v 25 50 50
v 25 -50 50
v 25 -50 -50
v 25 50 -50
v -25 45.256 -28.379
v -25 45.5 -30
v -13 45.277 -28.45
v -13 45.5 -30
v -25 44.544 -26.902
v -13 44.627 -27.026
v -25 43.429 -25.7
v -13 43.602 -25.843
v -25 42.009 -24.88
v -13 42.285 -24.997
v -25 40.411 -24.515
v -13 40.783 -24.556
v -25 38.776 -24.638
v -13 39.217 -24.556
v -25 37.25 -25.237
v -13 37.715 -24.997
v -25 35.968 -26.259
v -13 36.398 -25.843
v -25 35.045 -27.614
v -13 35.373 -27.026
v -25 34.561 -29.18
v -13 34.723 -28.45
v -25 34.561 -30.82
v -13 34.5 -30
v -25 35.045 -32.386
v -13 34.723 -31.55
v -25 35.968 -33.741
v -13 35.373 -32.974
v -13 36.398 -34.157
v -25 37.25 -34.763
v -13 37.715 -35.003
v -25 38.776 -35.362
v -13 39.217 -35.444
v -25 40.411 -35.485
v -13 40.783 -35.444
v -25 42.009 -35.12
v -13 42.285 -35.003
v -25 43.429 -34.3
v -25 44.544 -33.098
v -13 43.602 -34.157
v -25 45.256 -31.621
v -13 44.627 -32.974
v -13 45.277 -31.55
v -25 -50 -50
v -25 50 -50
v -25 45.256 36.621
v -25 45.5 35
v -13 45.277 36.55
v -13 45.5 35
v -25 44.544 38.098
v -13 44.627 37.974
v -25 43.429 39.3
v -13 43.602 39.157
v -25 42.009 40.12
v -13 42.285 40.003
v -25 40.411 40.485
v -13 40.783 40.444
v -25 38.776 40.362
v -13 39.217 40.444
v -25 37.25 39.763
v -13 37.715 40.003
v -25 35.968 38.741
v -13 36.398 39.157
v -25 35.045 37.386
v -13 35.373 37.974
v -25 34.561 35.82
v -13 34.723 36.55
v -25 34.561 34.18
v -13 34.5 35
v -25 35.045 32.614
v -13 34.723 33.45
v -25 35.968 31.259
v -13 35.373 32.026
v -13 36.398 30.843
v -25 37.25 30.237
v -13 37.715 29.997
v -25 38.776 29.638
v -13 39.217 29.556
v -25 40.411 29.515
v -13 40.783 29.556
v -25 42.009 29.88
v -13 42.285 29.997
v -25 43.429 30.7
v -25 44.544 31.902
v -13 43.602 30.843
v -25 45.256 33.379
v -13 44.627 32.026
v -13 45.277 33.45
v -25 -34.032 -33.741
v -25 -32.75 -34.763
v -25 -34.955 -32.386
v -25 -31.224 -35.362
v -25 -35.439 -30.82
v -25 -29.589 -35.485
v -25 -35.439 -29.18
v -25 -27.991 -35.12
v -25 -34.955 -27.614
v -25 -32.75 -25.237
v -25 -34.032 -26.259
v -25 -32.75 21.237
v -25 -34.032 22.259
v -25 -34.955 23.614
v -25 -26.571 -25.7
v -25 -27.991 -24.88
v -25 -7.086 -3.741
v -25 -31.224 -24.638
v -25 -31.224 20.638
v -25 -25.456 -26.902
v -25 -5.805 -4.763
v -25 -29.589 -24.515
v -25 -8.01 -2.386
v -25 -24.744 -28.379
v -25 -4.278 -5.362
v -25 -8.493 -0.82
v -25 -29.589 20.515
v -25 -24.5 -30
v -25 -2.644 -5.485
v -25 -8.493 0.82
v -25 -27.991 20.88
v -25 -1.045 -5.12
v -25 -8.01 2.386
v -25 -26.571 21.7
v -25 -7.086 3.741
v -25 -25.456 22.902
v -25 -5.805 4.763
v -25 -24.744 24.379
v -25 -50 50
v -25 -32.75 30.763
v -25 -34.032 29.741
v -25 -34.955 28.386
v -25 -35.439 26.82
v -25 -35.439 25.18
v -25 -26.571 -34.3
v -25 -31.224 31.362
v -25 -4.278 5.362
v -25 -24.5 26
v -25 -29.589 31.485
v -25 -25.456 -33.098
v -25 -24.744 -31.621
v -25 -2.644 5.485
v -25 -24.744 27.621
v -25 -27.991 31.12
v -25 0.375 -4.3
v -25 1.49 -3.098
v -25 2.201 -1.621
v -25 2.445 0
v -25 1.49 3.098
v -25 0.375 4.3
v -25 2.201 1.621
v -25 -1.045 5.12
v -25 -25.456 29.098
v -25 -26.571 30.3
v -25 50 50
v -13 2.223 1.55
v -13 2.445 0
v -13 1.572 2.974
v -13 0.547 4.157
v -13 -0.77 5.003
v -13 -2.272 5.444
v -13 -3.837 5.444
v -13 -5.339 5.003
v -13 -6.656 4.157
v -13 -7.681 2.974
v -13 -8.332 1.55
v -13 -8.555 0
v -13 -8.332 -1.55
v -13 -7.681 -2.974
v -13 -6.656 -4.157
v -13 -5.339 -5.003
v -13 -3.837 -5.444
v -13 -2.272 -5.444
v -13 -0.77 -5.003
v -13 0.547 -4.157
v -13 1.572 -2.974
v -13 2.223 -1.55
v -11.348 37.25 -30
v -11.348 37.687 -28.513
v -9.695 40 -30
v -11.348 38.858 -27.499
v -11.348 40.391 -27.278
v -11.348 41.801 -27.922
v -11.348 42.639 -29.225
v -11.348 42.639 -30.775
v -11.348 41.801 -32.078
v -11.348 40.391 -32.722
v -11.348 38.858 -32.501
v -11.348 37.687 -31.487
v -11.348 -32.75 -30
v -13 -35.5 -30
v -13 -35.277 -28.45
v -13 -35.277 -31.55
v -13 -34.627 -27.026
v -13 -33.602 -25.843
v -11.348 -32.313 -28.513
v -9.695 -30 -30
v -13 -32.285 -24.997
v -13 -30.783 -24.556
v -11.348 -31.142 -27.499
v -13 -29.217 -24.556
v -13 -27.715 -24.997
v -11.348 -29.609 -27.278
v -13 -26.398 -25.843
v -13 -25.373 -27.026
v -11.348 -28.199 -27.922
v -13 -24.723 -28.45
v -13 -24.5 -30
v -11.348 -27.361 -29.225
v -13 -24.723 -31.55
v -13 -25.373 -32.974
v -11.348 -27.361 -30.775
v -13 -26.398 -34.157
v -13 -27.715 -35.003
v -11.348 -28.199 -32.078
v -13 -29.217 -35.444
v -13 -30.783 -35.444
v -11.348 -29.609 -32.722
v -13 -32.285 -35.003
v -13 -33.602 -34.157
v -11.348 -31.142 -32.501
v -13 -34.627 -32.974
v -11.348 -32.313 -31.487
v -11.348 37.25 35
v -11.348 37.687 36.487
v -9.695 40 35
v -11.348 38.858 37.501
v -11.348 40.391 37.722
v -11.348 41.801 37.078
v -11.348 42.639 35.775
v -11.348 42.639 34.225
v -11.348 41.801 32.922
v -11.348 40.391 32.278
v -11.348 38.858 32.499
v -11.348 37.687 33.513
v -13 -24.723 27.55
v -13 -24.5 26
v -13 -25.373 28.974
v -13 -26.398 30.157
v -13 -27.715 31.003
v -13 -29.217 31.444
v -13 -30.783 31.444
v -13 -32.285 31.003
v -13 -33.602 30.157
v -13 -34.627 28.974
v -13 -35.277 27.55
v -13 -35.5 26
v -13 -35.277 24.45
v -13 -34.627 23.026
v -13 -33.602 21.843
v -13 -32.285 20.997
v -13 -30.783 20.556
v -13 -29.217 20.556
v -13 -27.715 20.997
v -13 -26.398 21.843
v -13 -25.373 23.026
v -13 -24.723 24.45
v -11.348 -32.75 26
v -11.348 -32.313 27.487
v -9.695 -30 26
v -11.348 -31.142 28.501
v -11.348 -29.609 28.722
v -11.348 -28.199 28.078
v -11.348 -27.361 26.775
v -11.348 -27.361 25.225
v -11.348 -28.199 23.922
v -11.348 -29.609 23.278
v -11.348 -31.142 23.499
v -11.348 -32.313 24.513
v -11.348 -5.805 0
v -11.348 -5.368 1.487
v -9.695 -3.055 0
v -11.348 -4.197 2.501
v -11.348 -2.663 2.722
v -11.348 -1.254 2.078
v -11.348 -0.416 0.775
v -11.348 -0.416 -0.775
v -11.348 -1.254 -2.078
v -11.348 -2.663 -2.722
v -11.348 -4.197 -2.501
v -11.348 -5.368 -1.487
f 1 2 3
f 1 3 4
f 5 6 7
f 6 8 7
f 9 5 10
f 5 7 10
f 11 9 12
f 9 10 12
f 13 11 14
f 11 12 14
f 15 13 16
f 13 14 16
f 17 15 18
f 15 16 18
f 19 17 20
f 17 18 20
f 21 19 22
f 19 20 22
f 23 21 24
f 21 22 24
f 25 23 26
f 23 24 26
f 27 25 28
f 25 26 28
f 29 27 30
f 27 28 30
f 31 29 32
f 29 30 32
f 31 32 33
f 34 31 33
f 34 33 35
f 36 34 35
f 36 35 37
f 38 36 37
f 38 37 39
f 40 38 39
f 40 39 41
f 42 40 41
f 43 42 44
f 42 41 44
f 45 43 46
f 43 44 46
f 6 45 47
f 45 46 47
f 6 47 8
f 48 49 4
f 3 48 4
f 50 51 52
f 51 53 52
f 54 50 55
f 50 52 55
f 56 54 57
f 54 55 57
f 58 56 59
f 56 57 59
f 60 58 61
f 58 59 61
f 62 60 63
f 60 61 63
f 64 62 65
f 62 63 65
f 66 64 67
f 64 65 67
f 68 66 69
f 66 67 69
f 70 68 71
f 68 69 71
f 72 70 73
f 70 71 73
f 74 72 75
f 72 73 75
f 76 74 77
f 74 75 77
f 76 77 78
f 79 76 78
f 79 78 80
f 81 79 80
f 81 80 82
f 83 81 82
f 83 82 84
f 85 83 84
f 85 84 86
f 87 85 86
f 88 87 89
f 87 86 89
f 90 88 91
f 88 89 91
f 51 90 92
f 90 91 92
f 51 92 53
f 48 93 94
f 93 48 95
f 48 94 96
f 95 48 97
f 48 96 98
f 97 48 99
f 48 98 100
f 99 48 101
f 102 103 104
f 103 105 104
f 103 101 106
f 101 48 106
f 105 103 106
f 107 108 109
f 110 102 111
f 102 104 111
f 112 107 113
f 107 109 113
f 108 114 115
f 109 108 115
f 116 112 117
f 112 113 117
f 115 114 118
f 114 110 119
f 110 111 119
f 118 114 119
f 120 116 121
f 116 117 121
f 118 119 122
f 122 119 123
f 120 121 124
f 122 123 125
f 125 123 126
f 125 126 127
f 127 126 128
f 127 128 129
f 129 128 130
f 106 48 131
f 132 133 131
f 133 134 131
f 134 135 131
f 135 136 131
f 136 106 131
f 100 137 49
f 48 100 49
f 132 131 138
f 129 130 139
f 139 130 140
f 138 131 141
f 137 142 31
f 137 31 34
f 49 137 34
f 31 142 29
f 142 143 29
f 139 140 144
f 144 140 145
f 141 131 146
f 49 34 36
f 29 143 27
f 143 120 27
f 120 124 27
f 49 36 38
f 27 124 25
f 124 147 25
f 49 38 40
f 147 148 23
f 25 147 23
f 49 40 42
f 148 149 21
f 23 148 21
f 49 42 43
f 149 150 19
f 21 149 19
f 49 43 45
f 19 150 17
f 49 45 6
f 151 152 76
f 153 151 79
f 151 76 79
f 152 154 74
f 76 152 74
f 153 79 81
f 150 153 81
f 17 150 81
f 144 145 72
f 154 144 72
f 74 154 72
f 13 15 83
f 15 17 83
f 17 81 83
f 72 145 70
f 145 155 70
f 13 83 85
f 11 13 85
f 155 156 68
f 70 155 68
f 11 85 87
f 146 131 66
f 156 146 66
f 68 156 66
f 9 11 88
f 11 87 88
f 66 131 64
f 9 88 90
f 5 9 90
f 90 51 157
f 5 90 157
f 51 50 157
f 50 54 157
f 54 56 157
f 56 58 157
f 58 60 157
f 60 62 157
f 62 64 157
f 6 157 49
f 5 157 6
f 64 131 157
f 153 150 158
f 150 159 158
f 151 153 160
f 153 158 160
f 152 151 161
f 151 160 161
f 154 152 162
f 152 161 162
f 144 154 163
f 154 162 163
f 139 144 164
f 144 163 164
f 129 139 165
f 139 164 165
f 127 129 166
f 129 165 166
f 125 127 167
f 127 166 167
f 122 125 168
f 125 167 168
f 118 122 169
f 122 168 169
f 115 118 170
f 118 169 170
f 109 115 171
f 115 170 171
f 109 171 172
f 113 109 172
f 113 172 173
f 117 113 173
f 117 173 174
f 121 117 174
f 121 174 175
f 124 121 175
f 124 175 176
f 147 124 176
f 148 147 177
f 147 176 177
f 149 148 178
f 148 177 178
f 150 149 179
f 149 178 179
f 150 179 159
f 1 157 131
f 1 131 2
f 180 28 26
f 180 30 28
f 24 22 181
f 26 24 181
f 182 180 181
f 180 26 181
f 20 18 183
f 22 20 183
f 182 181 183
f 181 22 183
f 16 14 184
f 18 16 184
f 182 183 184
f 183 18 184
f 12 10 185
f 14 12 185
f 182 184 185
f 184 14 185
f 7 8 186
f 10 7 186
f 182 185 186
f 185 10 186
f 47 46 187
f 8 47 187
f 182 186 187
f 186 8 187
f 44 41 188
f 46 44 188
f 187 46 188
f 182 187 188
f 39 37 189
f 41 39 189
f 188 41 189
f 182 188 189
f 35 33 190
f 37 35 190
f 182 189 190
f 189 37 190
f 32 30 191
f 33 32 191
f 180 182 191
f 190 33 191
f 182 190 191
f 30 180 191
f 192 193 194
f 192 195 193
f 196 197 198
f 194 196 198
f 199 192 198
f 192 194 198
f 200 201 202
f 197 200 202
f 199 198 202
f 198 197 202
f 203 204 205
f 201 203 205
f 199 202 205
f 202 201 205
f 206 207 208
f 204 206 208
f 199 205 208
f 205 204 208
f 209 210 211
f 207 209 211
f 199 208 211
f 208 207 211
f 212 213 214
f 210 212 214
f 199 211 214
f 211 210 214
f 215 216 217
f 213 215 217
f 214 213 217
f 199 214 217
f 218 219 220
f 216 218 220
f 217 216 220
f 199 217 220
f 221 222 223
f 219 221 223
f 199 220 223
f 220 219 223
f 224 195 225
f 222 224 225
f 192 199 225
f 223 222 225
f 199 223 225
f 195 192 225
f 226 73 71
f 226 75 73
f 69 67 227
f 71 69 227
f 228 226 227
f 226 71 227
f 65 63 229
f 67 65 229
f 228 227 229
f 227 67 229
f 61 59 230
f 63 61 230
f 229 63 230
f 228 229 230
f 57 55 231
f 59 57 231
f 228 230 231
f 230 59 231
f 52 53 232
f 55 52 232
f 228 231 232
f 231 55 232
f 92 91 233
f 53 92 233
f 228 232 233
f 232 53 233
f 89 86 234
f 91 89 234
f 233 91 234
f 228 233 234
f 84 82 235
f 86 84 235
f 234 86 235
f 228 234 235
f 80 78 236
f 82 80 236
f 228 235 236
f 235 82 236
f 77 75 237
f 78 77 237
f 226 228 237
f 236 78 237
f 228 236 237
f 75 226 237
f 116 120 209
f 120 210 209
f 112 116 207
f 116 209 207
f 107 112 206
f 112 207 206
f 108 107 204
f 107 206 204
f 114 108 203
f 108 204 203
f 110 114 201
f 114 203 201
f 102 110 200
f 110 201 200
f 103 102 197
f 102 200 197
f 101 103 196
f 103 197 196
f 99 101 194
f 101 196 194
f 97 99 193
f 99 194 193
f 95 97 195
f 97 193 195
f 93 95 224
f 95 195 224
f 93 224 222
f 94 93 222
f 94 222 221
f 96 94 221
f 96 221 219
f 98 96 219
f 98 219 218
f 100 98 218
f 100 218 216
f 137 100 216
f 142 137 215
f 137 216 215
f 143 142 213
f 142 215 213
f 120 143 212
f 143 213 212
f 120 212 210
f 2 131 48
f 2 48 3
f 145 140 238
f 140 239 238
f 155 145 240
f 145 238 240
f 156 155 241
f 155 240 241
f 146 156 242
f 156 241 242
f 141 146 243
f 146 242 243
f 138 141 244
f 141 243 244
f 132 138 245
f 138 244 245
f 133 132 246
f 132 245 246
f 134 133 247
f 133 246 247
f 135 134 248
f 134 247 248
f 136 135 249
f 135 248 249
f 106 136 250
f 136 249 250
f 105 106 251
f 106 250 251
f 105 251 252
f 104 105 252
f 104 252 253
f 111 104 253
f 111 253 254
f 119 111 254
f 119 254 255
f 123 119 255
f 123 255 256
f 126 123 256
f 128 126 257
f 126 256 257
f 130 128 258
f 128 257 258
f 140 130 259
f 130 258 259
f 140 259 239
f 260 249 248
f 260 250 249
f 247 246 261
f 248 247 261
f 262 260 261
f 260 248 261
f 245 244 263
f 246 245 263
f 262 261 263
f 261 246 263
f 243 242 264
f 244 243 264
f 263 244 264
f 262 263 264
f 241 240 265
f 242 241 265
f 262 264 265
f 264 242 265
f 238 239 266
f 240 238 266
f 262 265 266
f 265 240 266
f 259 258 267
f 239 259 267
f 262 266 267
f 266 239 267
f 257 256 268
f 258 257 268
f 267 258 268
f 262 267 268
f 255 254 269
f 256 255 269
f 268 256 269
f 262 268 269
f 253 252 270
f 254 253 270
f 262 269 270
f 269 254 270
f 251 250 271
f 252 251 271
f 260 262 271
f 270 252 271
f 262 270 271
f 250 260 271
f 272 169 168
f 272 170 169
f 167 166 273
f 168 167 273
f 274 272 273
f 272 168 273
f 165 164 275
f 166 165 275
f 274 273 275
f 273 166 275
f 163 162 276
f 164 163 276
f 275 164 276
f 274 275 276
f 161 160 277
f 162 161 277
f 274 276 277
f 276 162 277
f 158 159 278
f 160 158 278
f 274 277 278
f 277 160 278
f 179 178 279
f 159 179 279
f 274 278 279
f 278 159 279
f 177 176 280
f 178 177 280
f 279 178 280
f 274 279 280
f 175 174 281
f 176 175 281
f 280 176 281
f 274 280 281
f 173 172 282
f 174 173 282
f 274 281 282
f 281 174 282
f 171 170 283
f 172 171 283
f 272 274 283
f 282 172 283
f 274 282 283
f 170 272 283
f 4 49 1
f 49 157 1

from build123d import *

# Parameters (mm, degrees)
F0_W          = 50
F0_H          = 100
F1_DEPTH      = 50
F1_DEPTH_BACK = 50
F3_D          = 11
F3_DEPTH      = 12
F3_TIP        = 3.3047334047


with BuildPart() as f1:
    # F0 (on Top) → F1 (new body, two sides)
    with BuildSketch(Plane.XY) as f1_sk:
        Rectangle(F0_W, F0_H)
    extrude(amount=F1_DEPTH)
    extrude(f1_sk.sketch, amount=-F1_DEPTH_BACK)

    # F3
    with Locations(Plane(origin=(-25, 0, 0), x_dir=(0, -1, 0), z_dir=(-1, 0, 0))):
        with Locations((-40, 35), (30, 26), (3.0545412681, 0), (30, -30), (-40, -30)):
            Hole(F3_D / 2, depth=F3_DEPTH)
            with Locations((0, 0, -(F3_DEPTH + F3_TIP / 2))):  # 118° drill point
                Cone(0, F3_D / 2, F3_TIP, mode=Mode.SUBTRACT)


solid = f1.part
